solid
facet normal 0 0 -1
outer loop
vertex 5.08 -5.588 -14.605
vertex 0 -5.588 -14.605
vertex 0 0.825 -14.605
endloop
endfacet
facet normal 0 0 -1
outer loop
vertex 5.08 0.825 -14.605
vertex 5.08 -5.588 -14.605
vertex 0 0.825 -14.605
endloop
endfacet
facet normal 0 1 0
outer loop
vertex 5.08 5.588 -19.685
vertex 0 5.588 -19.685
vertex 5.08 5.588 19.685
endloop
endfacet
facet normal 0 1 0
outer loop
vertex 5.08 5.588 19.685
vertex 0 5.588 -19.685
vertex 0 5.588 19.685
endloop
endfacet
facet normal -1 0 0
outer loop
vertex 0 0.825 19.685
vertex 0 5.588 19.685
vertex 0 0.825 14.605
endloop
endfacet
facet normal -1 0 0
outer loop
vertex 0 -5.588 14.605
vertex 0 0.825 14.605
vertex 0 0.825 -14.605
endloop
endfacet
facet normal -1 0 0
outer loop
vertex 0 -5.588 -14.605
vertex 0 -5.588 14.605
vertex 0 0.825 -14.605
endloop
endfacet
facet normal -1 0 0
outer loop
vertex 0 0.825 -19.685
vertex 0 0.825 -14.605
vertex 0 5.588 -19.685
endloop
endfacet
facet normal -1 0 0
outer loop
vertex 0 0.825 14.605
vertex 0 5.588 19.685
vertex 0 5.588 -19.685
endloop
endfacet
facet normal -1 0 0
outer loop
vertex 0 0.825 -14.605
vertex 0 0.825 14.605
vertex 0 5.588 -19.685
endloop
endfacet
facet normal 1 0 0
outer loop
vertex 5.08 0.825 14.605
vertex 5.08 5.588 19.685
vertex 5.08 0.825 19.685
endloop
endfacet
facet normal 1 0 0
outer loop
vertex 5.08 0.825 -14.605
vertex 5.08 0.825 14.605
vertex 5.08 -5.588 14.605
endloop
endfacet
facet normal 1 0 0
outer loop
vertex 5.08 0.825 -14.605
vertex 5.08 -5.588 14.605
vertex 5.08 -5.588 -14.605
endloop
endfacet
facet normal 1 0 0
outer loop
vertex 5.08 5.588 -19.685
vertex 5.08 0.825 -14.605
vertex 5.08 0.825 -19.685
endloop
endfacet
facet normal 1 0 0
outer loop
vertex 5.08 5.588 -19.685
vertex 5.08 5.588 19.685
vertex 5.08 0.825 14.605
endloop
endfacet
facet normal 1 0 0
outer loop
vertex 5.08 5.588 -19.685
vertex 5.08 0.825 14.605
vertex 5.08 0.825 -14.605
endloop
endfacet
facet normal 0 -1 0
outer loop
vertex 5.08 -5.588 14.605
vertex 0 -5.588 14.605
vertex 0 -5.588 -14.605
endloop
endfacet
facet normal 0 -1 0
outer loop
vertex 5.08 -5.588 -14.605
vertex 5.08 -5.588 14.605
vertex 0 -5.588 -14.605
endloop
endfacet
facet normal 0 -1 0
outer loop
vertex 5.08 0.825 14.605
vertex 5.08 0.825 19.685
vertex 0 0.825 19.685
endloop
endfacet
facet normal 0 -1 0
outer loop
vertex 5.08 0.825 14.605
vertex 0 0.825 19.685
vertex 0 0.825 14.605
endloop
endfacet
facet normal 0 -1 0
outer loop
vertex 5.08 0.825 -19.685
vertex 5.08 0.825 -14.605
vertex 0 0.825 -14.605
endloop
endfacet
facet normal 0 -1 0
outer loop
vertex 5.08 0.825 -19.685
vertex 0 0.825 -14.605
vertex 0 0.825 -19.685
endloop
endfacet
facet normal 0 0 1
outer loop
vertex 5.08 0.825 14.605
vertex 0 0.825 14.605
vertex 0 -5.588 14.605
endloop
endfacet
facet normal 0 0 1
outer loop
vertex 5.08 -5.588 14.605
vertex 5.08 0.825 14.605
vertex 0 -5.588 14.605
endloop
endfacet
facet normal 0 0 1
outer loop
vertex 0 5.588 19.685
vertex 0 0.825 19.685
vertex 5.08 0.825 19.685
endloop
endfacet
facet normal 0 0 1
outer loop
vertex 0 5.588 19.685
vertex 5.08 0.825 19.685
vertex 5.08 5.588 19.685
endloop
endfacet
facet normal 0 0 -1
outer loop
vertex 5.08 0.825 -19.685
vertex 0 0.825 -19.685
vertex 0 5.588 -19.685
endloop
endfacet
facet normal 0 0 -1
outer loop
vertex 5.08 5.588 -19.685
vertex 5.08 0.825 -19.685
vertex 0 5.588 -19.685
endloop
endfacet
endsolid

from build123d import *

# Parameters (mm, degrees)
SKETCH1_W           = 29.21
SKETCH1_H           = 11.176
SKETCH1_W_2         = 5.08
SKETCH1_H_2         = 4.7625
BOSS_EXTRUDE1_DEPTH = 5.08


with BuildPart() as part:
    # Sketch1 → Boss-Extrude1 (new body)
    with BuildSketch(Plane(origin=(0, 0, 0), x_dir=(0, 0, -1), z_dir=(1, 0, 0))):
        Rectangle(SKETCH1_W, SKETCH1_H)
        Polygon((-14.605, 0.8255), (-14.605, -5.588), (14.605, -5.588), (14.605, 0.8255), (14.605, 5.588), (-14.605, 5.588), align=None)
        with Locations((-17.145, 3.20675)):
            Rectangle(SKETCH1_W_2, SKETCH1_H_2)
        with Locations((17.145, 3.20675)):
            Rectangle(SKETCH1_W_2, SKETCH1_H_2)
    extrude(amount=BOSS_EXTRUDE1_DEPTH)


solid = part.part
